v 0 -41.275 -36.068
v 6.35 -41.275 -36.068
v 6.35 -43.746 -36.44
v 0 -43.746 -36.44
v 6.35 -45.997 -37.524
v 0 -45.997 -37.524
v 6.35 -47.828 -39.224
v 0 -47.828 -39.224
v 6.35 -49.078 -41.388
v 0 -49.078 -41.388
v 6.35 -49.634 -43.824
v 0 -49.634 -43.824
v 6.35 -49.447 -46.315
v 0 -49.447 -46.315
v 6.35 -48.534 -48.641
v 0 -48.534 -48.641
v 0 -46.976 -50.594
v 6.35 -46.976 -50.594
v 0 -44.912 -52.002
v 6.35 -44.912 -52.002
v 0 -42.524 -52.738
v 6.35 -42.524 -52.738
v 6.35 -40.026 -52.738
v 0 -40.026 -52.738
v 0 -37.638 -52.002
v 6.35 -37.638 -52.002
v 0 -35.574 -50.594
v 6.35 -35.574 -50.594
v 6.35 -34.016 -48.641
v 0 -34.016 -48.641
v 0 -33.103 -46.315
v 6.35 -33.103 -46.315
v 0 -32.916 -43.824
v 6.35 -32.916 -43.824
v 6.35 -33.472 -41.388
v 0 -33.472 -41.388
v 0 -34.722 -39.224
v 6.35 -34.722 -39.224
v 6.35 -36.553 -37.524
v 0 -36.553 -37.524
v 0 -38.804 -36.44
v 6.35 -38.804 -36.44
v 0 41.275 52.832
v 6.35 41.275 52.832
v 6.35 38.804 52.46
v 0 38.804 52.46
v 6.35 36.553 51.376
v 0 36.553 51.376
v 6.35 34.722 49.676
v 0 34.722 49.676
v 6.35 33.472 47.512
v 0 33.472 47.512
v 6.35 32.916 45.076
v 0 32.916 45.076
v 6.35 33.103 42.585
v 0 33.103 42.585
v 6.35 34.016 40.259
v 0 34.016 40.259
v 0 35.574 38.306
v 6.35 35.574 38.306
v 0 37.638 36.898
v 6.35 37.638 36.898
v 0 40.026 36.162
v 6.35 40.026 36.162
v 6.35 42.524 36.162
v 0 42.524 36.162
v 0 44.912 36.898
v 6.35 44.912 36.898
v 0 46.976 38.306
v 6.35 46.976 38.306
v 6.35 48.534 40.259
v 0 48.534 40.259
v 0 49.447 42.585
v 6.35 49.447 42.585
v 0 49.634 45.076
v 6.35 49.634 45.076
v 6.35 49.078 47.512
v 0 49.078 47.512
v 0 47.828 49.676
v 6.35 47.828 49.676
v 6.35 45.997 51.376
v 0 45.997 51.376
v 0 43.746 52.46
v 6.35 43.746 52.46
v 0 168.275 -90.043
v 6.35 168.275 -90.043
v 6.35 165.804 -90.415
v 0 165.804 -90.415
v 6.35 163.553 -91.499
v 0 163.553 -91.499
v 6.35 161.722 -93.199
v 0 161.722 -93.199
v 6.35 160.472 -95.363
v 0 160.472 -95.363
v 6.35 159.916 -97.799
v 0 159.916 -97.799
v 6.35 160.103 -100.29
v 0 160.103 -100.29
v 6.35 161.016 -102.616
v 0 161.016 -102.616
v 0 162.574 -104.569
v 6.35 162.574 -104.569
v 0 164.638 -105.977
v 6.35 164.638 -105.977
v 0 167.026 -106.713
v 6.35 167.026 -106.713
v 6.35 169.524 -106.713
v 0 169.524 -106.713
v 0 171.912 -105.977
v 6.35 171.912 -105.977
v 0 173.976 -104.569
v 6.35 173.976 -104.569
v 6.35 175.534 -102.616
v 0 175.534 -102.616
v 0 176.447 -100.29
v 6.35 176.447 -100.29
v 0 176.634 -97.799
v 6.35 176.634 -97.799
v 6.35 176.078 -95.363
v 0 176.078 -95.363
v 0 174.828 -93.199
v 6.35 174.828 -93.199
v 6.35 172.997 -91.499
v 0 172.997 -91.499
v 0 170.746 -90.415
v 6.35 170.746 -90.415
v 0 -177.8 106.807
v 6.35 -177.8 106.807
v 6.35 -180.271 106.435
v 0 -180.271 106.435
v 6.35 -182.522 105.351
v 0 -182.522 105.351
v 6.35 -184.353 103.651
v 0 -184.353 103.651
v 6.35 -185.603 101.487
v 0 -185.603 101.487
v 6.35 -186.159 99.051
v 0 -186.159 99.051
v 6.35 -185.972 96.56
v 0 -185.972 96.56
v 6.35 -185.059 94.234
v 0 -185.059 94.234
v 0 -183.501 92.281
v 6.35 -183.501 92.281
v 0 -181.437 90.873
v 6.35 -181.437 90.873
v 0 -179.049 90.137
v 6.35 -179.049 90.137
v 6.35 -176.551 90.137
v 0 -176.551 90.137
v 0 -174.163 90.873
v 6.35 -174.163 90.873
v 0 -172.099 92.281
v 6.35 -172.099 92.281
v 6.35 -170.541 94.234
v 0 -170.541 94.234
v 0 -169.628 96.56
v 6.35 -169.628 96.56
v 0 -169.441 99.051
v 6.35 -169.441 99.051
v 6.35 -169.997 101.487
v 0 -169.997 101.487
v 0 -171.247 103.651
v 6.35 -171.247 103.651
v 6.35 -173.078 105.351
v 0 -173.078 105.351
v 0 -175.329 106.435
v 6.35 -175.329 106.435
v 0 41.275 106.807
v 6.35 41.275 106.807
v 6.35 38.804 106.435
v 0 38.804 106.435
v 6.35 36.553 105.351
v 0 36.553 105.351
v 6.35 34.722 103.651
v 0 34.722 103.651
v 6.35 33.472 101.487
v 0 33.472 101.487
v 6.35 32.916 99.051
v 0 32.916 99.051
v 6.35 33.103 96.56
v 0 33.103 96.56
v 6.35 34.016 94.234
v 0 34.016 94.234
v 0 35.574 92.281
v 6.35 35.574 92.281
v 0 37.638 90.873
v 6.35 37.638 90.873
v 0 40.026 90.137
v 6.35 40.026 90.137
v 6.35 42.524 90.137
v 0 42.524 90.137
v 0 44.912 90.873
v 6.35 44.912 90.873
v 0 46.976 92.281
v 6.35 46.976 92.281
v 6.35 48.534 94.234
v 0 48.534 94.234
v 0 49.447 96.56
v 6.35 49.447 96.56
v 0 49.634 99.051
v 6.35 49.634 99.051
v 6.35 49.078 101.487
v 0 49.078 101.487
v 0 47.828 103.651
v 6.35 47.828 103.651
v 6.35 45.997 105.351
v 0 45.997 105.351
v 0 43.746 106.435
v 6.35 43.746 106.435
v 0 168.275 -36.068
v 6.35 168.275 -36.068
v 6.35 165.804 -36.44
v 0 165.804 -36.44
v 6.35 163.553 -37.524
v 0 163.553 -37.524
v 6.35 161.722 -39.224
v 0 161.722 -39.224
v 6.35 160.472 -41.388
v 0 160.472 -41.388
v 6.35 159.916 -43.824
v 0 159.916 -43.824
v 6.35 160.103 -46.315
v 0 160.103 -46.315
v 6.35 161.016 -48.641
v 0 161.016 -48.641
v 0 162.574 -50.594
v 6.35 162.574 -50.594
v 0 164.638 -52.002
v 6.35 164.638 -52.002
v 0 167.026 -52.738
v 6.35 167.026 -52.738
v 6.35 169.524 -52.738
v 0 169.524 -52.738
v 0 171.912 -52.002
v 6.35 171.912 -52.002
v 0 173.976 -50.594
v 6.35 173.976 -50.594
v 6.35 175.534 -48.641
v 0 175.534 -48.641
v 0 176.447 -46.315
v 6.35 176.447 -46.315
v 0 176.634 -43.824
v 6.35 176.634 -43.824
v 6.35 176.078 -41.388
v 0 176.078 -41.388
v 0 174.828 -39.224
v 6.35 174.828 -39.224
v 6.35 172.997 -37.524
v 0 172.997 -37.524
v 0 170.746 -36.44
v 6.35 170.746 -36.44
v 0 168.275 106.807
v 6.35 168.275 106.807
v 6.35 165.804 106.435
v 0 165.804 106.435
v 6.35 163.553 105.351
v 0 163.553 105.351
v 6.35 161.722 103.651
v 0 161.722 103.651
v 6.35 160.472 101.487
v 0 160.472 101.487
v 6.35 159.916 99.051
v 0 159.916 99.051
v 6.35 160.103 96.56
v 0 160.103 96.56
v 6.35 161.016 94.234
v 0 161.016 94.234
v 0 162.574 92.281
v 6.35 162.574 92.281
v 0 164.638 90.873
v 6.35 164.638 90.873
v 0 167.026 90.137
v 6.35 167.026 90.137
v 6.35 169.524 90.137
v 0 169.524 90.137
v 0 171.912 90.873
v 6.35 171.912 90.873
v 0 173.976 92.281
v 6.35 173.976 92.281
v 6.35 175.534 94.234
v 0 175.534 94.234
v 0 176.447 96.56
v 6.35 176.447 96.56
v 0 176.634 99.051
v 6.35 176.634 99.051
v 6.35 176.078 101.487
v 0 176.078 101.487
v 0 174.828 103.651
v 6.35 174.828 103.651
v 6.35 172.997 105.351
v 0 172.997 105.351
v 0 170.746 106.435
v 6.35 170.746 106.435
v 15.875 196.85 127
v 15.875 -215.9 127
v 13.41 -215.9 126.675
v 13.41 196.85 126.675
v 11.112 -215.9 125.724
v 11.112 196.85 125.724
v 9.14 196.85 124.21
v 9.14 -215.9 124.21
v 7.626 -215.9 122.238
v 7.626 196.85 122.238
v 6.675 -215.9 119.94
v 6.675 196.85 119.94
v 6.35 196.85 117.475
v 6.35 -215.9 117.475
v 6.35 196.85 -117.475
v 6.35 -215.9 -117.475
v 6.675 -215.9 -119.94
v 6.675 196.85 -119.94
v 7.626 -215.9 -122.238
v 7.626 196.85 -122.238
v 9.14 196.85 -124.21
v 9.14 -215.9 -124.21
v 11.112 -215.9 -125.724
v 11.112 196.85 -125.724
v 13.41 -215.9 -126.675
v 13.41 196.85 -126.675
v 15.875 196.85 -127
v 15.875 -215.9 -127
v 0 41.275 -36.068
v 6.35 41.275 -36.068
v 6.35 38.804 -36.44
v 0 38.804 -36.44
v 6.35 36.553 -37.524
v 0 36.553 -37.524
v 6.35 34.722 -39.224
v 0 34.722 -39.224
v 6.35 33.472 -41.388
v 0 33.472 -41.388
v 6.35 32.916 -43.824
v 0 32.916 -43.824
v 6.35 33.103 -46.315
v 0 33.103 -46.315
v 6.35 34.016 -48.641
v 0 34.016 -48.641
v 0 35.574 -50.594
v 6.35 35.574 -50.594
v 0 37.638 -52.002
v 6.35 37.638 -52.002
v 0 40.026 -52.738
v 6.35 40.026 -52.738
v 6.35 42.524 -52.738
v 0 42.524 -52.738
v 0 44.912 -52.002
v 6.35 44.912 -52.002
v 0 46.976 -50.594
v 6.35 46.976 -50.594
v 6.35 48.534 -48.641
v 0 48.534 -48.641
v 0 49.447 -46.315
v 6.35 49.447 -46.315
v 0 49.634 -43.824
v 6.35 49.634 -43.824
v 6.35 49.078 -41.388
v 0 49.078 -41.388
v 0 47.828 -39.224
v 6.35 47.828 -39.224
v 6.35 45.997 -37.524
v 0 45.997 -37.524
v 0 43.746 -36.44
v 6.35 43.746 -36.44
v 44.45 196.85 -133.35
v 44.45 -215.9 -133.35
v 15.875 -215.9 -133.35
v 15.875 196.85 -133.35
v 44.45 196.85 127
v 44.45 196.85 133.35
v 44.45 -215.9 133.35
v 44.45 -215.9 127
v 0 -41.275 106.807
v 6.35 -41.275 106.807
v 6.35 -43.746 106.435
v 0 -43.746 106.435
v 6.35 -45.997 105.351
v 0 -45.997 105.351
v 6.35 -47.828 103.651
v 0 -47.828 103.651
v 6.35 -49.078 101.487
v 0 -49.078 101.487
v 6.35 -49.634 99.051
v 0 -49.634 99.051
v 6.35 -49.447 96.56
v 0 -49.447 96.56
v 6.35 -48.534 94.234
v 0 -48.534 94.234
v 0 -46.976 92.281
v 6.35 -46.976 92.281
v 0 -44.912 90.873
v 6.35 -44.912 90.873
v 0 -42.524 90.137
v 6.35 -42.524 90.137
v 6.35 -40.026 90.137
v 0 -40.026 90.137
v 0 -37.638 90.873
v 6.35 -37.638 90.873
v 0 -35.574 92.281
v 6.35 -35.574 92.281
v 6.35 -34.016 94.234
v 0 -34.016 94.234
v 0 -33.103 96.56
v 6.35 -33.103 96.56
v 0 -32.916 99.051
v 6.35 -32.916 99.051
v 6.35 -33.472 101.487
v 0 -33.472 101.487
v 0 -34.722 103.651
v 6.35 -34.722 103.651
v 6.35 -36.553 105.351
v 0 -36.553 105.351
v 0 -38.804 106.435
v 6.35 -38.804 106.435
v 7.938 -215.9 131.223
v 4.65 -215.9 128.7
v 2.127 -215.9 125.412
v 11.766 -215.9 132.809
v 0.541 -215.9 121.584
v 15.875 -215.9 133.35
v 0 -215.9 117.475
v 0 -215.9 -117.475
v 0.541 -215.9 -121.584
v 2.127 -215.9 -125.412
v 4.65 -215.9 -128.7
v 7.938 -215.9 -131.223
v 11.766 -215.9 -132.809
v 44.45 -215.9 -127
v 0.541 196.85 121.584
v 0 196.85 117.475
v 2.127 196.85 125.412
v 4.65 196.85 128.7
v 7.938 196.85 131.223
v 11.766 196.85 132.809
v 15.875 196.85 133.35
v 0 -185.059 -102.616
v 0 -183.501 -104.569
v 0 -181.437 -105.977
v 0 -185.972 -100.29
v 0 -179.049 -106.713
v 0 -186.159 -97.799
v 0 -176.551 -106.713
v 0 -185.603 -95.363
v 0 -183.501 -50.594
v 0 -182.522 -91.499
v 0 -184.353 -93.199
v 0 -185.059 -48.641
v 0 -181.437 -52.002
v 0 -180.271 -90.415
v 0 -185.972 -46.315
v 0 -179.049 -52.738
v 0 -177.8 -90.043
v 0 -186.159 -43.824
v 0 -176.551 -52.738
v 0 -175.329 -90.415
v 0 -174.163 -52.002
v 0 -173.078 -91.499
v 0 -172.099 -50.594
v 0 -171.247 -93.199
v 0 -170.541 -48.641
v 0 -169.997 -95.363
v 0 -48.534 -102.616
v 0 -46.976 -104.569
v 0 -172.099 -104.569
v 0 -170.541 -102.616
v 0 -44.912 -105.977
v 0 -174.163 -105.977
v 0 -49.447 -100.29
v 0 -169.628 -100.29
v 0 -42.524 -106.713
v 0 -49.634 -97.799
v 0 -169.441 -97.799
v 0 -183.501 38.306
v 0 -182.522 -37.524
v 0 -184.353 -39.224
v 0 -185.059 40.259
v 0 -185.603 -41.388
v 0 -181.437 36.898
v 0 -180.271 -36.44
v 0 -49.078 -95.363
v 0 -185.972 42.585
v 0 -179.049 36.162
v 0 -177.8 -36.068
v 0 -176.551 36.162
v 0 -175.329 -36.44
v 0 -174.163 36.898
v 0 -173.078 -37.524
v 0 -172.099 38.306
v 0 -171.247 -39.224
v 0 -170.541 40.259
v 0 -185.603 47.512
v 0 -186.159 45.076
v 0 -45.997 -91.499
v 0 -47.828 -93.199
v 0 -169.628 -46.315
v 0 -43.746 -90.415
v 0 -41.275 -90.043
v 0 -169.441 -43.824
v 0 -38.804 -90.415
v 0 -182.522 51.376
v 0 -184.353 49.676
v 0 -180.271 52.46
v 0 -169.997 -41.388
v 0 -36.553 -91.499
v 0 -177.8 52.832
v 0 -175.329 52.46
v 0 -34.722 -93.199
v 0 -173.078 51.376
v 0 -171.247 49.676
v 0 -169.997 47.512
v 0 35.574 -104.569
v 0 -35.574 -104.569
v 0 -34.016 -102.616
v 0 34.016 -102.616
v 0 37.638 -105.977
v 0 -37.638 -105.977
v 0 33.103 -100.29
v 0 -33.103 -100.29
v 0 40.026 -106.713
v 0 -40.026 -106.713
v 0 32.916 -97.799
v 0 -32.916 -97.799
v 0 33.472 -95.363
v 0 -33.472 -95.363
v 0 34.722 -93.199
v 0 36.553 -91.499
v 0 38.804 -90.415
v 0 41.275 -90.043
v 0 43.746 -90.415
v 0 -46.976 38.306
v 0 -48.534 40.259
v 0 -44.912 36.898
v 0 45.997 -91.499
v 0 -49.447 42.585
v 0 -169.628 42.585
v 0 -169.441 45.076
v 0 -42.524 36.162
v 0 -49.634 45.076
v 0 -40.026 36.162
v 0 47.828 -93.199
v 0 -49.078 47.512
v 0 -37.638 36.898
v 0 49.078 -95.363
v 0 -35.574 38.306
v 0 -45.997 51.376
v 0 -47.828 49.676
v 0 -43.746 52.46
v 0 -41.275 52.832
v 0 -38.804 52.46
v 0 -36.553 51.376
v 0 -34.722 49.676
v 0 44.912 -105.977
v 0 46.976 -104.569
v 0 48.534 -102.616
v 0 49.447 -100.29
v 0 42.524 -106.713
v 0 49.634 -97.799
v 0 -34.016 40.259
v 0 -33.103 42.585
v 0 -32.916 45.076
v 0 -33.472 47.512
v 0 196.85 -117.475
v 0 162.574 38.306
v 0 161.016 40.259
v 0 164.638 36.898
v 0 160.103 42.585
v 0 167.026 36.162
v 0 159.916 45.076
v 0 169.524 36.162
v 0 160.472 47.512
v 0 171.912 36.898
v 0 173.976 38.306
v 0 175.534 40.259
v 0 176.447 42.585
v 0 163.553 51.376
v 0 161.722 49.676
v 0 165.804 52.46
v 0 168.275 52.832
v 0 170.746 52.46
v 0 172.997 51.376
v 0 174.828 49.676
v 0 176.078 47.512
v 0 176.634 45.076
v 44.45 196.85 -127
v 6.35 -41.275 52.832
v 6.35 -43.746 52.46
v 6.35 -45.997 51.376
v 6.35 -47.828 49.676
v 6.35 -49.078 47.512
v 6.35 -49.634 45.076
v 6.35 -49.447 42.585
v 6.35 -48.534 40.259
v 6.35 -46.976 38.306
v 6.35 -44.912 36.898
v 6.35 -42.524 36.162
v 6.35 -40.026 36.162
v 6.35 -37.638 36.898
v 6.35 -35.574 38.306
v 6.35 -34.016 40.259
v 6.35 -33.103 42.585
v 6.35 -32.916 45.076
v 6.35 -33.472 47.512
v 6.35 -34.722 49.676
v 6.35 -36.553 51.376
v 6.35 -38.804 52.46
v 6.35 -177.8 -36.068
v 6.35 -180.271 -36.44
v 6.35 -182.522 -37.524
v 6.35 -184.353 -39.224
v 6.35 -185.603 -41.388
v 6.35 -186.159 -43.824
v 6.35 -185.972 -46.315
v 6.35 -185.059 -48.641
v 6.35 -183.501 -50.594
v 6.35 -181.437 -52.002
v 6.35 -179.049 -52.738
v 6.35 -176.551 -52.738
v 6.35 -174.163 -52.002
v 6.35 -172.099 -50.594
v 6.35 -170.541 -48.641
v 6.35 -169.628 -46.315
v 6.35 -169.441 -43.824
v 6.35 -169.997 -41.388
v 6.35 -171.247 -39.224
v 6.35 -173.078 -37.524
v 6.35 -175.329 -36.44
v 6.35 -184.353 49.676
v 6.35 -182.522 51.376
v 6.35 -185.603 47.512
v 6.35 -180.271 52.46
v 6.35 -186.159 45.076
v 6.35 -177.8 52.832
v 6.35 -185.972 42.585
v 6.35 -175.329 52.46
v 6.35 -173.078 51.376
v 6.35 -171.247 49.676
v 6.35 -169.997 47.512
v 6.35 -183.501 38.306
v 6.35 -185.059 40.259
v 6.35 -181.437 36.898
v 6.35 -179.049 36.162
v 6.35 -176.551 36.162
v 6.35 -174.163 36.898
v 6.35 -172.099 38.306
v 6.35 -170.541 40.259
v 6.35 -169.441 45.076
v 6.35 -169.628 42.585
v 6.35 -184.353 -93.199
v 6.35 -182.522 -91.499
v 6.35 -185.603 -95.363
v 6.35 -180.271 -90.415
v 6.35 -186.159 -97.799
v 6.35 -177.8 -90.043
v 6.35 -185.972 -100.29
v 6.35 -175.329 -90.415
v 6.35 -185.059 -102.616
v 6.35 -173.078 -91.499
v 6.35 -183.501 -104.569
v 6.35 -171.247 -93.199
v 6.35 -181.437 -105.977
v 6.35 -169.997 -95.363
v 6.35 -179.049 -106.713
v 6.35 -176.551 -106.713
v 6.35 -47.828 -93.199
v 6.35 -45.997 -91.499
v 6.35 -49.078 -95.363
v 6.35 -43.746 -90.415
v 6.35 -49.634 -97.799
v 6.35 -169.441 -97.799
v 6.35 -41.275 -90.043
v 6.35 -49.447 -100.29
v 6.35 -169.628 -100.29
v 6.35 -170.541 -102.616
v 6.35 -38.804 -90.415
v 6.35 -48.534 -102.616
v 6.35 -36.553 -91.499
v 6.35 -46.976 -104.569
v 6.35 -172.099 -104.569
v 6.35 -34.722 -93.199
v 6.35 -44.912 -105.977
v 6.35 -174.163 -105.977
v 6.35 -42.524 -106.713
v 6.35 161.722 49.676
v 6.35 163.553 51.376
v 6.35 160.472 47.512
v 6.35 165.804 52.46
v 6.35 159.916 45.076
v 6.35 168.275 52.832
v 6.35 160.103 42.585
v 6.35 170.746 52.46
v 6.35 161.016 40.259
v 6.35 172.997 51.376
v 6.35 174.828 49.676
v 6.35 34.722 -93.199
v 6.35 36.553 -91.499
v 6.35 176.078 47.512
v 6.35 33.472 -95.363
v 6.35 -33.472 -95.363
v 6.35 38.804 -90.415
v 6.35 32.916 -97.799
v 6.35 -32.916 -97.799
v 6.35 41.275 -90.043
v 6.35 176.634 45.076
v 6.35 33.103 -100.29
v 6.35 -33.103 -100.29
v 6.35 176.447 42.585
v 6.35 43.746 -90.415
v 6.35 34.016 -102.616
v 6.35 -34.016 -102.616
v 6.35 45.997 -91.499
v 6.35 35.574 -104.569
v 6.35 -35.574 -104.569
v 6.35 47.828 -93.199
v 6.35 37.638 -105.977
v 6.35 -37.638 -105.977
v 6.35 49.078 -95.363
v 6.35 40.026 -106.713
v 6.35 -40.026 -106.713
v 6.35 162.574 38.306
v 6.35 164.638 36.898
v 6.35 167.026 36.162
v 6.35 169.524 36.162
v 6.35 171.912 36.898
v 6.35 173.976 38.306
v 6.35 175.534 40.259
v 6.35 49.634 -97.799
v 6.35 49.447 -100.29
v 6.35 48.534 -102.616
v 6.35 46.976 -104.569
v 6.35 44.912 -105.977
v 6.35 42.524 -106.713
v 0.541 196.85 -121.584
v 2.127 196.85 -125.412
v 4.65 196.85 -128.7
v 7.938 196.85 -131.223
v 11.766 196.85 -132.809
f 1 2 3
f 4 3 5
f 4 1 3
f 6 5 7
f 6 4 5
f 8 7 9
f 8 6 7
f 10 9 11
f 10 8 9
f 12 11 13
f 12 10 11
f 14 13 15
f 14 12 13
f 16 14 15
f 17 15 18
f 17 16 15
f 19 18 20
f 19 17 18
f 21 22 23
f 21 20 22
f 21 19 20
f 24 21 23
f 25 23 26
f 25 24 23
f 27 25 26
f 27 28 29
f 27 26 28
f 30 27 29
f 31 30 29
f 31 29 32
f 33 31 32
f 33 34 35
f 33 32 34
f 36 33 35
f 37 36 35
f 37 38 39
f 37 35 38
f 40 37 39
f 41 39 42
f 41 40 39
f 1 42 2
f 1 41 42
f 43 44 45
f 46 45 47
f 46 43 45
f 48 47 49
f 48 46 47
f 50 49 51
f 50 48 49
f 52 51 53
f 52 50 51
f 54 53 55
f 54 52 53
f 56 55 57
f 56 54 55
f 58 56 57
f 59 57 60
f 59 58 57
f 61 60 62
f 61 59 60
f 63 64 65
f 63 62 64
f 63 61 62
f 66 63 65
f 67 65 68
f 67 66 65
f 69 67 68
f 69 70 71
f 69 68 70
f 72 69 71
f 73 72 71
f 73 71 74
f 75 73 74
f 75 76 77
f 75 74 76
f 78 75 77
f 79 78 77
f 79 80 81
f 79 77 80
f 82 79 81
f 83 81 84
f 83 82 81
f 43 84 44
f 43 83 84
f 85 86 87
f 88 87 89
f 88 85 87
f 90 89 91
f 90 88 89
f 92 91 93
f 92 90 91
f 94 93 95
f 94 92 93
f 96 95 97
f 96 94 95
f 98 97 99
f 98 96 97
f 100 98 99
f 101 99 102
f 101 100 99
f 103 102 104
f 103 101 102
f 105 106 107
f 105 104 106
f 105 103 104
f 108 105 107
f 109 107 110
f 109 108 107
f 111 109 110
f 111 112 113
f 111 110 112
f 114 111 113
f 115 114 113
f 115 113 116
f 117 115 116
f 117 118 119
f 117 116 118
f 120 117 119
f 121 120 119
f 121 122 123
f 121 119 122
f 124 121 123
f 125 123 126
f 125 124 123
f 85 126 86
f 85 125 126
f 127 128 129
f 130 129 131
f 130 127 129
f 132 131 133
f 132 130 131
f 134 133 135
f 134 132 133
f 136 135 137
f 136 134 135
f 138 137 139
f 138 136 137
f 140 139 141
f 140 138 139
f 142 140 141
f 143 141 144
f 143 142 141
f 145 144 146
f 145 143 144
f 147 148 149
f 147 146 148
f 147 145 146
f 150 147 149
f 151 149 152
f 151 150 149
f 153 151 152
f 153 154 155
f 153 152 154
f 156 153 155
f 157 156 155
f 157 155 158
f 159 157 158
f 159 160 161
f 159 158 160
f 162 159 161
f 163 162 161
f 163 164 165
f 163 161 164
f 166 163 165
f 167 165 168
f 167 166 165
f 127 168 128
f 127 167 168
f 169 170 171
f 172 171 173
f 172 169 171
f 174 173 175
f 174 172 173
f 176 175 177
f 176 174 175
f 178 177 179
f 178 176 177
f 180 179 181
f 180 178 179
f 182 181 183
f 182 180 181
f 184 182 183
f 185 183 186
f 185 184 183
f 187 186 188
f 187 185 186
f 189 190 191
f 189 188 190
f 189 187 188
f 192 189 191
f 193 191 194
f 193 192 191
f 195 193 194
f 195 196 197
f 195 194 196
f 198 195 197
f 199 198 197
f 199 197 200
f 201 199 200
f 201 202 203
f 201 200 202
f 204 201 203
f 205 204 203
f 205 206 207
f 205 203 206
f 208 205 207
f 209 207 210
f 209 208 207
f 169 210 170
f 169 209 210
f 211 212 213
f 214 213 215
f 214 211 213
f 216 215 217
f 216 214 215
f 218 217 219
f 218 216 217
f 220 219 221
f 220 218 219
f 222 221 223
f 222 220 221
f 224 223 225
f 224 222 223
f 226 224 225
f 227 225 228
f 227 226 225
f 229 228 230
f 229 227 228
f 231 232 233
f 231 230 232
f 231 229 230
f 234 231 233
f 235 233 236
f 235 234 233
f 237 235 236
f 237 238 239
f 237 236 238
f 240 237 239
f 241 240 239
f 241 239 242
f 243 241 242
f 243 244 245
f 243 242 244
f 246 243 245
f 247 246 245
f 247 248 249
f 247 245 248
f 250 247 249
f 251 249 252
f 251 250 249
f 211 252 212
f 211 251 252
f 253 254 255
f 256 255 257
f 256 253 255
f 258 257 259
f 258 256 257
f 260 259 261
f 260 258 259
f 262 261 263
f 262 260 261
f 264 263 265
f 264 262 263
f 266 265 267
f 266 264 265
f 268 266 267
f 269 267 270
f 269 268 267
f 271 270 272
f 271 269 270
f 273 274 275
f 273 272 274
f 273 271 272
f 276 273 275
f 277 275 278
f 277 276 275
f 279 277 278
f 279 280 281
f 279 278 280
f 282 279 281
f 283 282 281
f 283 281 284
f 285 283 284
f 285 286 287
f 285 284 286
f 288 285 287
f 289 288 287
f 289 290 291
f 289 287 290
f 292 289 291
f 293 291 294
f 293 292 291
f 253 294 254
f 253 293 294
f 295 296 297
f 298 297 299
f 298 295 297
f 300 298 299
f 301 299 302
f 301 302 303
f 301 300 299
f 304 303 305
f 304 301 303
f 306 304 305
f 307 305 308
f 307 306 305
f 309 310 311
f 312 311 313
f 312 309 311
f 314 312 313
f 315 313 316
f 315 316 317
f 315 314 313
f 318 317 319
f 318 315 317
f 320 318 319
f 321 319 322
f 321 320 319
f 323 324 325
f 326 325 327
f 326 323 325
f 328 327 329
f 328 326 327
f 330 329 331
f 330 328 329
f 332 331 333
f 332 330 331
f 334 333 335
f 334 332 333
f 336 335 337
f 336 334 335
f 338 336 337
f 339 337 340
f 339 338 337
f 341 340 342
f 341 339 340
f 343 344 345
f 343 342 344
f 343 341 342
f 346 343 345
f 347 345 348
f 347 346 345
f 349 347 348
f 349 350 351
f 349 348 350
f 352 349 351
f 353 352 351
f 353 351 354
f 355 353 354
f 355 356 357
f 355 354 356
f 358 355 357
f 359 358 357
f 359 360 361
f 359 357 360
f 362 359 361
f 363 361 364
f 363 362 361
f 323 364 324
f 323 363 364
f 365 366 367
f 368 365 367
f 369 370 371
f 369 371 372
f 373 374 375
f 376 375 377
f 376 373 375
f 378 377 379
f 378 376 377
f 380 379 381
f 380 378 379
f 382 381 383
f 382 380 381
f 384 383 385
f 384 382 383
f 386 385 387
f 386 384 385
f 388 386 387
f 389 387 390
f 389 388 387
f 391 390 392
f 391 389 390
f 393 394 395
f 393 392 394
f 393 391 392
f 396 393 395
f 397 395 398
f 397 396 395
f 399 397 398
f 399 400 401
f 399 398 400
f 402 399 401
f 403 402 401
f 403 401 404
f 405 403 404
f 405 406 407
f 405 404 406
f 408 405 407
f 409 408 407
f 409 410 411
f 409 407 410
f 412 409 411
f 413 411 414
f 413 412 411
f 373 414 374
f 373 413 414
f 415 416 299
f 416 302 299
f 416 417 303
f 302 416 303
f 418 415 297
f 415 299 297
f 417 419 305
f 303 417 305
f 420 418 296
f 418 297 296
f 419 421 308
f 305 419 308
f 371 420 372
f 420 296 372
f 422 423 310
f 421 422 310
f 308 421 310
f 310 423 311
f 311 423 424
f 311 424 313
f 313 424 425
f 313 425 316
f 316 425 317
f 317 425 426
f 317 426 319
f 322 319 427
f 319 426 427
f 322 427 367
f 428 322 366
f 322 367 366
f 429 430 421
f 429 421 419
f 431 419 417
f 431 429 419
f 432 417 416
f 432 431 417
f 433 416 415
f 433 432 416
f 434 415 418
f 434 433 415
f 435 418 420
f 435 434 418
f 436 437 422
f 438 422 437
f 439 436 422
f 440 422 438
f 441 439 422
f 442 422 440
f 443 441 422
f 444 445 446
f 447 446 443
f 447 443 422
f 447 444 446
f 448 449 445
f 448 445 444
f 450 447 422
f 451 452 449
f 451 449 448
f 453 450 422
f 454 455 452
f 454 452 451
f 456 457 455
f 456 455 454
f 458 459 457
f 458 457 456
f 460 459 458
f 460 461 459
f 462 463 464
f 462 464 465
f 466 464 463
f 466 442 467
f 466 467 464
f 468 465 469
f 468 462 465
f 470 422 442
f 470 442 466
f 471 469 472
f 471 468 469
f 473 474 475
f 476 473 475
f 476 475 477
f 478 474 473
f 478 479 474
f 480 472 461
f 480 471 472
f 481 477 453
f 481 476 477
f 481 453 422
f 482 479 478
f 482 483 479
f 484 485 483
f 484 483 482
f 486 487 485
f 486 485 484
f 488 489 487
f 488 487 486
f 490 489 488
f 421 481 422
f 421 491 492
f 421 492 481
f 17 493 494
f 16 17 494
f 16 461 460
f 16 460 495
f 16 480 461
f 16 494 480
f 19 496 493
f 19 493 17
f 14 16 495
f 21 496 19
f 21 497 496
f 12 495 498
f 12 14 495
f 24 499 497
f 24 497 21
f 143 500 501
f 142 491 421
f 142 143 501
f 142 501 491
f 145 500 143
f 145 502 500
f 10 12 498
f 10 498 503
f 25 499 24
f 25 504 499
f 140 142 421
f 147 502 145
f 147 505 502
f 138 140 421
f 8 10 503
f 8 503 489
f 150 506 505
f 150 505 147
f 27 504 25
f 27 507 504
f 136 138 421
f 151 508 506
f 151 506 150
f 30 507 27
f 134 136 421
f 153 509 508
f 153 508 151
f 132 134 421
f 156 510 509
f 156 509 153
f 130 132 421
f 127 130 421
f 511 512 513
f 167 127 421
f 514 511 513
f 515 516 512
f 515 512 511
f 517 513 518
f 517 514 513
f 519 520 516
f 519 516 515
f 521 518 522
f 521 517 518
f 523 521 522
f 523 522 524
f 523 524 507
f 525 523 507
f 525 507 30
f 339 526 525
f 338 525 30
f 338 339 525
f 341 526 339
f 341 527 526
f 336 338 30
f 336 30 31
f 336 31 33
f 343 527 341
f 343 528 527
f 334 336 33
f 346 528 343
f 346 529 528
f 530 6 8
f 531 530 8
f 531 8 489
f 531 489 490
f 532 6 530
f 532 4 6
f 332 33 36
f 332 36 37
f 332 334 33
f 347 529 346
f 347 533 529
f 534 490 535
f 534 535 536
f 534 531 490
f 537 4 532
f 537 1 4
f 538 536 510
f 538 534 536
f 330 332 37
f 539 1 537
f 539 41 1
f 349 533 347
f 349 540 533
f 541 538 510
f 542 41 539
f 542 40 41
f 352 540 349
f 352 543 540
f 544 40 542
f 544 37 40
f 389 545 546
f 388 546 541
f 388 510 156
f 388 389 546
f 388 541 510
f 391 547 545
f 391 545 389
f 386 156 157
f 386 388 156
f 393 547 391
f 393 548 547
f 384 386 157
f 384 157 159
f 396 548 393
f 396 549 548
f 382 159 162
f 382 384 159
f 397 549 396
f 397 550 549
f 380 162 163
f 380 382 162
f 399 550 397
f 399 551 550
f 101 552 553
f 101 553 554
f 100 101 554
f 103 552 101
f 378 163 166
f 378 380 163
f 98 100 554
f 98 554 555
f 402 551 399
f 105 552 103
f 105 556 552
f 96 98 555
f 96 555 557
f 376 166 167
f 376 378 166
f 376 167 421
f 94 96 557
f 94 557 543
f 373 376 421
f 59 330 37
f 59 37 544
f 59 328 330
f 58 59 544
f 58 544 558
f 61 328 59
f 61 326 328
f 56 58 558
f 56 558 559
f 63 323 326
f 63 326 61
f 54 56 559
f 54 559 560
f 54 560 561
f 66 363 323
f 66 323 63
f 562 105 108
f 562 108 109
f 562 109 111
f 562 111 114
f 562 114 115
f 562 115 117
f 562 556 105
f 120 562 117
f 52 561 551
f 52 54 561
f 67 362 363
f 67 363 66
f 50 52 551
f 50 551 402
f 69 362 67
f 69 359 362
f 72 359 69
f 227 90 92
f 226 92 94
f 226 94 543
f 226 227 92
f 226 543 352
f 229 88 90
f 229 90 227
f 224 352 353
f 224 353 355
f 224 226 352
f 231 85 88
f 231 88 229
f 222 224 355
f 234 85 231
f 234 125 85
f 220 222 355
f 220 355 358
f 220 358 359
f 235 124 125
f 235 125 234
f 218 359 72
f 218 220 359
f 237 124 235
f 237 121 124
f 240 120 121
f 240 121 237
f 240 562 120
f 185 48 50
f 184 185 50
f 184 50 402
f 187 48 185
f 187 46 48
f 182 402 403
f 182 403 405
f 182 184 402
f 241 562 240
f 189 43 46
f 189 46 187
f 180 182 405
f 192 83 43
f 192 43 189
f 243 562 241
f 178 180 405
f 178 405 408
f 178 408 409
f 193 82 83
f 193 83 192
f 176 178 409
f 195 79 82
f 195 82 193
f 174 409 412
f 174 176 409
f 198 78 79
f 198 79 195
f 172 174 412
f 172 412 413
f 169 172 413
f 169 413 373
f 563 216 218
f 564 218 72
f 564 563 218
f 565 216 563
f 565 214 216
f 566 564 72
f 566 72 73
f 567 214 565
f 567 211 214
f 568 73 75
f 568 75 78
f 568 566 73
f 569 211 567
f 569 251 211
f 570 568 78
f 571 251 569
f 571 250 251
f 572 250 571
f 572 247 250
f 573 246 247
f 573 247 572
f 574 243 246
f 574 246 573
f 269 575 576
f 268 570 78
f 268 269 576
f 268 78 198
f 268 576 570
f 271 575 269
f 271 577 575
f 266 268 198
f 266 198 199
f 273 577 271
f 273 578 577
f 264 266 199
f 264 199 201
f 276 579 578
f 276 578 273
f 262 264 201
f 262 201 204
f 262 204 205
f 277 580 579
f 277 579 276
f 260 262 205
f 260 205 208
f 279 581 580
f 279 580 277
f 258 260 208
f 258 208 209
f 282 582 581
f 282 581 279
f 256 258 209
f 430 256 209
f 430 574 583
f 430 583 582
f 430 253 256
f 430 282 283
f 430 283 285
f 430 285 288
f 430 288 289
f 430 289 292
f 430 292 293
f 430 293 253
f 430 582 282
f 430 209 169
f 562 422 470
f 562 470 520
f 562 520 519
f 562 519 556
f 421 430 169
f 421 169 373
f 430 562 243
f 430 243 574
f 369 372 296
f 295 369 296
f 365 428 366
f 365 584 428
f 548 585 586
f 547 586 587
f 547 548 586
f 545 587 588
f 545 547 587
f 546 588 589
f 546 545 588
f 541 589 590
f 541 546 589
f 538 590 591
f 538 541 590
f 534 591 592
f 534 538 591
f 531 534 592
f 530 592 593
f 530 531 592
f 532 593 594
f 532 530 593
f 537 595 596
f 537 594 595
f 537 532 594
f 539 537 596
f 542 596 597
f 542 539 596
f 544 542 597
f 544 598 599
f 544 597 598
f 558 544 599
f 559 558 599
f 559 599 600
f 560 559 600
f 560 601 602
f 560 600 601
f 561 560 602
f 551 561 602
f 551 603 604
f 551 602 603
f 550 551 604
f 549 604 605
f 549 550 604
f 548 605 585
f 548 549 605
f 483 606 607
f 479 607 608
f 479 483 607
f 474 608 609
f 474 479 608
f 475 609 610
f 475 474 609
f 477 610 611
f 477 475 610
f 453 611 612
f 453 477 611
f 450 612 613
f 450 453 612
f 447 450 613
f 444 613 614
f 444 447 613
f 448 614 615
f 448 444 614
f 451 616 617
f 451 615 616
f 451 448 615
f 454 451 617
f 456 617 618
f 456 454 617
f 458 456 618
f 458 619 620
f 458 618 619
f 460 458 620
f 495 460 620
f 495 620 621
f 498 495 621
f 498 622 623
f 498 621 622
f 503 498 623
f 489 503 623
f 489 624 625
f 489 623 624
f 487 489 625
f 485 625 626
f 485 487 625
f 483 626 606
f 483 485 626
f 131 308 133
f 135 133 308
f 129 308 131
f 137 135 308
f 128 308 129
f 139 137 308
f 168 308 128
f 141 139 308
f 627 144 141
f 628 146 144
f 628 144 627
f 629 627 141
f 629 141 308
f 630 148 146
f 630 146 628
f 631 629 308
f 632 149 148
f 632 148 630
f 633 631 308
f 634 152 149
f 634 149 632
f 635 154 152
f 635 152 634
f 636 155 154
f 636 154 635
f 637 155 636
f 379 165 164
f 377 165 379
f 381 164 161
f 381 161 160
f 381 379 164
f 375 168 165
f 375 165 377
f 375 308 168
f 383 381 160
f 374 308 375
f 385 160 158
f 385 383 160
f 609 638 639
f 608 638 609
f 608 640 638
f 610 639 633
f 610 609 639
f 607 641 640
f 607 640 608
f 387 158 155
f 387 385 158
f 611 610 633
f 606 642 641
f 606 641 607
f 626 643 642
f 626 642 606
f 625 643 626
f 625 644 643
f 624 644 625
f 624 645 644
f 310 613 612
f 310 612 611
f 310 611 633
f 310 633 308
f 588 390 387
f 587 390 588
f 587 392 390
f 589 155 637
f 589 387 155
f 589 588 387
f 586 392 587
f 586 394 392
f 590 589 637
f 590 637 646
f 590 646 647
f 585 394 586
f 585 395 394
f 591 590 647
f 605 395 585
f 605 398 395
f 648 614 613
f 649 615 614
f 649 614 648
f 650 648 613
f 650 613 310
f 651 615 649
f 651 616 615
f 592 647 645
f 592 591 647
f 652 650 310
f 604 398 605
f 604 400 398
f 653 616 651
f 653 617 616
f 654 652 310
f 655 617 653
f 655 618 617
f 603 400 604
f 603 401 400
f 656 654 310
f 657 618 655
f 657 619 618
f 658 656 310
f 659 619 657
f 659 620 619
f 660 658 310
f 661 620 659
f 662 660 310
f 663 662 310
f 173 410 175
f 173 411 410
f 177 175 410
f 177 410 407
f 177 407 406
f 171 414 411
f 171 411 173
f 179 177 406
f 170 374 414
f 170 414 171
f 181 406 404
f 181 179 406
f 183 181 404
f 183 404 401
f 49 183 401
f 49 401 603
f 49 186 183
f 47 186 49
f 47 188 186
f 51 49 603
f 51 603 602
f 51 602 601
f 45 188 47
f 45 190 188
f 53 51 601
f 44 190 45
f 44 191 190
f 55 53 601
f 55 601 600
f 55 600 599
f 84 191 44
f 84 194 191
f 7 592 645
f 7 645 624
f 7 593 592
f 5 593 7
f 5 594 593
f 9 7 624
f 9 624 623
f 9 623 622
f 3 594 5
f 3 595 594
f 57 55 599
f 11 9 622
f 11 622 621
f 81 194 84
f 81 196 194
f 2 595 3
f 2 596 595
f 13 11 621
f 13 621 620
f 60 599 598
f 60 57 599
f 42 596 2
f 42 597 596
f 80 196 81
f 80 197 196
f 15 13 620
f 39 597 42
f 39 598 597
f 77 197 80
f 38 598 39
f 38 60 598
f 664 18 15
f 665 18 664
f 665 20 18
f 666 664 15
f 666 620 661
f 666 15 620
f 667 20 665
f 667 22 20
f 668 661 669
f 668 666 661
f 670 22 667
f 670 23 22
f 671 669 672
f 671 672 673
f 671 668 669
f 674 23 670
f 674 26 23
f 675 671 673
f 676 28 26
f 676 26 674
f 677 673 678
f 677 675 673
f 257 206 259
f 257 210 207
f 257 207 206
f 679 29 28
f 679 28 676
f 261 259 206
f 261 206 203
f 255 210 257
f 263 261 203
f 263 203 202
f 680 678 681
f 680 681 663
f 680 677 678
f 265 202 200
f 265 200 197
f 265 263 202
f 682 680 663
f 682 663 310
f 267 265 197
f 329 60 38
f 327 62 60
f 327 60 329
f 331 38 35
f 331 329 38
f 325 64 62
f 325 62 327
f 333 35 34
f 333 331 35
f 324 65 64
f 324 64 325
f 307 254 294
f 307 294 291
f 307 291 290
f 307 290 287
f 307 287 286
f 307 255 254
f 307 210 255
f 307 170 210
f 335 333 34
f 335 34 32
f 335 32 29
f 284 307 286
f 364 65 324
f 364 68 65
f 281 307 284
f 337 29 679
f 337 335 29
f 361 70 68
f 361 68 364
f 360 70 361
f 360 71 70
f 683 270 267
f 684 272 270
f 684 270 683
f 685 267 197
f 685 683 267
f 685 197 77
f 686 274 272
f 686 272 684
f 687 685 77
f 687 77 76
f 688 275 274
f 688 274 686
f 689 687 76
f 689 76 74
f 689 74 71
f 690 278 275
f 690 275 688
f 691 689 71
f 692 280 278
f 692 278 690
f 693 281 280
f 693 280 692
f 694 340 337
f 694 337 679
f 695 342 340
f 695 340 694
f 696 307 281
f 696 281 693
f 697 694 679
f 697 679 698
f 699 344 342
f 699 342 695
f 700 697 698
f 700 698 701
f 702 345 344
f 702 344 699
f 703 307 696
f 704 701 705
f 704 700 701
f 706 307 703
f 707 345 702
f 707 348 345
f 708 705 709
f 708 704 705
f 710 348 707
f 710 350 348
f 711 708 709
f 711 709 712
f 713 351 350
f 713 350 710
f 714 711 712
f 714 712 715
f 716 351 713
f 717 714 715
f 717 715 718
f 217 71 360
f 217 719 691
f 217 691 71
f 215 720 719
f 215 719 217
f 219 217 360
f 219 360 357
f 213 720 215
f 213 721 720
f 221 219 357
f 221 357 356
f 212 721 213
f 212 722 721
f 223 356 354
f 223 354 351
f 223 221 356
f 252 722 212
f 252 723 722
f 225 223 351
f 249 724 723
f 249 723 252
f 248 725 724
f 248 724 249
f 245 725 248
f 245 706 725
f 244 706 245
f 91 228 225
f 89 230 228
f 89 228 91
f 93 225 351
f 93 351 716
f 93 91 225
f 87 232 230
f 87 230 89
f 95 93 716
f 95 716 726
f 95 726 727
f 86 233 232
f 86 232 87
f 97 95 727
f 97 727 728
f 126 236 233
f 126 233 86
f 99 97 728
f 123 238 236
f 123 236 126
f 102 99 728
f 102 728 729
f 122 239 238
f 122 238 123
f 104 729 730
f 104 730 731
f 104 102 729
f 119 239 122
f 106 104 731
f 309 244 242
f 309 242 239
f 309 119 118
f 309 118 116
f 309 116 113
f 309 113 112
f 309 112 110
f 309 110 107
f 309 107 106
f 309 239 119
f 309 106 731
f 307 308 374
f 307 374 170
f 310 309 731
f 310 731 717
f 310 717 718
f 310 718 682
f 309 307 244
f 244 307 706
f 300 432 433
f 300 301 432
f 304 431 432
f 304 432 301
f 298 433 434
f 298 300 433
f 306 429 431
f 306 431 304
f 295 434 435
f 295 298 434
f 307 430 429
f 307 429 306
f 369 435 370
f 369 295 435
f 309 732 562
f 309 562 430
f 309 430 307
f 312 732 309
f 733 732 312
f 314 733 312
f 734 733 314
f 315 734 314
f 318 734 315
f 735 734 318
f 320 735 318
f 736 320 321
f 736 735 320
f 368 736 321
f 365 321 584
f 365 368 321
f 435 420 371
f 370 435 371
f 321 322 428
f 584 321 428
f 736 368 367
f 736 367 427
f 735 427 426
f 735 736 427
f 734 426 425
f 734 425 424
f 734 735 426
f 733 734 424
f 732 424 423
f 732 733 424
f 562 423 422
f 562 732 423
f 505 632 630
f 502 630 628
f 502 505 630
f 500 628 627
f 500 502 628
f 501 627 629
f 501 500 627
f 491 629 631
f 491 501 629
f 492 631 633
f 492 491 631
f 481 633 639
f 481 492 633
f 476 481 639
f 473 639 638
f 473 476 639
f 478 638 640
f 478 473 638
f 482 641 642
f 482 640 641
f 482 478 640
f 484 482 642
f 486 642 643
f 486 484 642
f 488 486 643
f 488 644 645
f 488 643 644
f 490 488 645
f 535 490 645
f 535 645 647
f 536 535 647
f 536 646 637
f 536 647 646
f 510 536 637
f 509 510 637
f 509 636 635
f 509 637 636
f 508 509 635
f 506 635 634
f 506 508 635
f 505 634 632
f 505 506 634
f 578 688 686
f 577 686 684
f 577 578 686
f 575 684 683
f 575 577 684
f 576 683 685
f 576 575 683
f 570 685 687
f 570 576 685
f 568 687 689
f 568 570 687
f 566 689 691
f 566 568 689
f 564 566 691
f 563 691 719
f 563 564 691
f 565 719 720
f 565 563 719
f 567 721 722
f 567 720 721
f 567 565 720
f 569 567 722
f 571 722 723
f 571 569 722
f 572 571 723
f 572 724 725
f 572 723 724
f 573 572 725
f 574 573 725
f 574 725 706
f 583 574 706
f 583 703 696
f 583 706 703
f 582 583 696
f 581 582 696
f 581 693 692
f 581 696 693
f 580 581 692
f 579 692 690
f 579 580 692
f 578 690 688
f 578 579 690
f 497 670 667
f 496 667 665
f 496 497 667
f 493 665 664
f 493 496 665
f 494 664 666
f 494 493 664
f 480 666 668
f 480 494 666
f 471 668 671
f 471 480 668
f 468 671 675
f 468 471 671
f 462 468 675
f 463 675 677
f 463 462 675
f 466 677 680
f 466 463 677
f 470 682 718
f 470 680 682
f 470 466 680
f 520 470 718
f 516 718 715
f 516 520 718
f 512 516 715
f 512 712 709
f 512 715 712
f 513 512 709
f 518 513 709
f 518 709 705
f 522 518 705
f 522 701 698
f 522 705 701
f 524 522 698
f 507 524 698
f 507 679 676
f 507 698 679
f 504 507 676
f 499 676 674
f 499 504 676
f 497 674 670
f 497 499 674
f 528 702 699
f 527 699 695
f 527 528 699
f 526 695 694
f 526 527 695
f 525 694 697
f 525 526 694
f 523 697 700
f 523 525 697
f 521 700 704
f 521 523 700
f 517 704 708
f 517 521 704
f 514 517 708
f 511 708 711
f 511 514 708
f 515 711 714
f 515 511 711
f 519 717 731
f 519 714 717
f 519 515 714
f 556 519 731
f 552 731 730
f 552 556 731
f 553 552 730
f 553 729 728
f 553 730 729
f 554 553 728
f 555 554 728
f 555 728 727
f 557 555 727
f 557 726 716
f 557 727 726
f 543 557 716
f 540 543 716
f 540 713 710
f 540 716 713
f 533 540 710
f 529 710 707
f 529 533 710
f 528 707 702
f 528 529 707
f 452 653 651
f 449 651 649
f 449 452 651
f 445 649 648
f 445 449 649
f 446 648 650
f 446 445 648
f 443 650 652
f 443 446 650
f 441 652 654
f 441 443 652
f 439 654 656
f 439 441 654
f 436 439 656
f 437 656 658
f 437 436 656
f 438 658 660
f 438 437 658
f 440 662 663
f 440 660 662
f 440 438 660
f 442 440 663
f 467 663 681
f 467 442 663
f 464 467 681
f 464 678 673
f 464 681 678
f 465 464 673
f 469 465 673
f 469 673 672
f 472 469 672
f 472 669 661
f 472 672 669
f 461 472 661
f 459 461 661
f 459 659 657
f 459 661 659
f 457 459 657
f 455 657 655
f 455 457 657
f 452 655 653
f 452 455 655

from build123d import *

# Parameters (mm, degrees)
BASE_EXTRUDE_THIN_DEPTH      = 196.85
BASE_EXTRUDE_THIN_DEPTH_BACK = 215.9
SKETCH3_R                    = 8.382
HOLES_DEPTH                  = 258.625377244


with BuildPart() as part:
    # Sketch1 → Base-Extrude-Thin (new, two sides)
    with BuildSketch(Plane(origin=(0, 0, 0), x_dir=(1, 0, 0), z_dir=(0, 1, 0))) as base_extrude_thin_sk:
        with BuildLine():
            Line((44.45, 133.35), (15.875, 133.35))
            ThreePointArc((15.875, 133.35), (4.649679849, 128.700320151), (0, 117.475))
            Line((0, 117.475), (0, 0))
            Line((0, 0), (0, -117.475))
            ThreePointArc((0, -117.475), (4.649679849, -128.700320151), (15.875, -133.35))
            Line((15.875, -133.35), (44.45, -133.35))
            Line((44.45, -133.35), (44.45, -127))
            Line((44.45, -127), (15.875, -127))
            ThreePointArc((15.875, -127), (9.139807909, -124.210192091), (6.35, -117.475))
            Line((6.35, -117.475), (6.35, 0))
            Line((6.35, 0), (6.35, 117.475))
            ThreePointArc((6.35, 117.475), (9.139807909, 124.210192091), (15.875, 127))
            Line((15.875, 127), (44.45, 127))
            Line((44.45, 127), (44.45, 133.35))
        make_face()
    extrude(amount=BASE_EXTRUDE_THIN_DEPTH)
    extrude(base_extrude_thin_sk.sketch, amount=-BASE_EXTRUDE_THIN_DEPTH_BACK)

    # Sketch3 (on Right Plane) → holes (cut, through all)
    with BuildSketch(Plane(origin=(0, 0, 0), x_dir=(0, 0, -1), z_dir=(1, 0, 0))):
        with Locations(Location((44.45, 168.275, 0), (0, 0, 180))):
            Circle(SKETCH3_R)
        with Locations(Location((44.45, 41.275, 0), (0, 0, 180))):
            Circle(SKETCH3_R)
        with Locations(Location((44.45, -41.275, 0), (0, 0, 180))):
            Circle(SKETCH3_R)
        with Locations(Location((44.45, -177.8, 0), (0, 0, 180))):
            Circle(SKETCH3_R)
        with Locations(Location((-44.45, -177.8, 0), (0, 0, 180))):
            Circle(SKETCH3_R)
        with Locations(Location((-98.425, -177.8, 0), (0, 0, 180))):
            Circle(SKETCH3_R)
        with Locations(Location((-98.425, -41.275, 0), (0, 0, 180))):
            Circle(SKETCH3_R)
        with Locations(Location((-44.45, -41.275, 0), (0, 0, 180))):
            Circle(SKETCH3_R)
        with Locations(Location((-44.45, 41.275, 0), (0, 0, 180))):
            Circle(SKETCH3_R)
        with Locations(Location((-98.425, 41.275, 0), (0, 0, 180))):
            Circle(SKETCH3_R)
        with Locations(Location((-98.425, 168.275, 0), (0, 0, 180))):
            Circle(SKETCH3_R)
        with Locations(Location((-44.45, 168.275, 0), (0, 0, 180))):
            Circle(SKETCH3_R)
        with Locations(Location((98.425, -177.8, 0), (0, 0, 180))):
            Circle(SKETCH3_R)
        with Locations(Location((98.425, -41.275, 0), (0, 0, 180))):
            Circle(SKETCH3_R)
        with Locations(Location((98.425, 41.275, 0), (0, 0, 180))):
            Circle(SKETCH3_R)
        with Locations(Location((98.425, 168.275, 0), (0, 0, 180))):
            Circle(SKETCH3_R)
    extrude(amount=HOLES_DEPTH, mode=Mode.SUBTRACT)


solid = part.part
